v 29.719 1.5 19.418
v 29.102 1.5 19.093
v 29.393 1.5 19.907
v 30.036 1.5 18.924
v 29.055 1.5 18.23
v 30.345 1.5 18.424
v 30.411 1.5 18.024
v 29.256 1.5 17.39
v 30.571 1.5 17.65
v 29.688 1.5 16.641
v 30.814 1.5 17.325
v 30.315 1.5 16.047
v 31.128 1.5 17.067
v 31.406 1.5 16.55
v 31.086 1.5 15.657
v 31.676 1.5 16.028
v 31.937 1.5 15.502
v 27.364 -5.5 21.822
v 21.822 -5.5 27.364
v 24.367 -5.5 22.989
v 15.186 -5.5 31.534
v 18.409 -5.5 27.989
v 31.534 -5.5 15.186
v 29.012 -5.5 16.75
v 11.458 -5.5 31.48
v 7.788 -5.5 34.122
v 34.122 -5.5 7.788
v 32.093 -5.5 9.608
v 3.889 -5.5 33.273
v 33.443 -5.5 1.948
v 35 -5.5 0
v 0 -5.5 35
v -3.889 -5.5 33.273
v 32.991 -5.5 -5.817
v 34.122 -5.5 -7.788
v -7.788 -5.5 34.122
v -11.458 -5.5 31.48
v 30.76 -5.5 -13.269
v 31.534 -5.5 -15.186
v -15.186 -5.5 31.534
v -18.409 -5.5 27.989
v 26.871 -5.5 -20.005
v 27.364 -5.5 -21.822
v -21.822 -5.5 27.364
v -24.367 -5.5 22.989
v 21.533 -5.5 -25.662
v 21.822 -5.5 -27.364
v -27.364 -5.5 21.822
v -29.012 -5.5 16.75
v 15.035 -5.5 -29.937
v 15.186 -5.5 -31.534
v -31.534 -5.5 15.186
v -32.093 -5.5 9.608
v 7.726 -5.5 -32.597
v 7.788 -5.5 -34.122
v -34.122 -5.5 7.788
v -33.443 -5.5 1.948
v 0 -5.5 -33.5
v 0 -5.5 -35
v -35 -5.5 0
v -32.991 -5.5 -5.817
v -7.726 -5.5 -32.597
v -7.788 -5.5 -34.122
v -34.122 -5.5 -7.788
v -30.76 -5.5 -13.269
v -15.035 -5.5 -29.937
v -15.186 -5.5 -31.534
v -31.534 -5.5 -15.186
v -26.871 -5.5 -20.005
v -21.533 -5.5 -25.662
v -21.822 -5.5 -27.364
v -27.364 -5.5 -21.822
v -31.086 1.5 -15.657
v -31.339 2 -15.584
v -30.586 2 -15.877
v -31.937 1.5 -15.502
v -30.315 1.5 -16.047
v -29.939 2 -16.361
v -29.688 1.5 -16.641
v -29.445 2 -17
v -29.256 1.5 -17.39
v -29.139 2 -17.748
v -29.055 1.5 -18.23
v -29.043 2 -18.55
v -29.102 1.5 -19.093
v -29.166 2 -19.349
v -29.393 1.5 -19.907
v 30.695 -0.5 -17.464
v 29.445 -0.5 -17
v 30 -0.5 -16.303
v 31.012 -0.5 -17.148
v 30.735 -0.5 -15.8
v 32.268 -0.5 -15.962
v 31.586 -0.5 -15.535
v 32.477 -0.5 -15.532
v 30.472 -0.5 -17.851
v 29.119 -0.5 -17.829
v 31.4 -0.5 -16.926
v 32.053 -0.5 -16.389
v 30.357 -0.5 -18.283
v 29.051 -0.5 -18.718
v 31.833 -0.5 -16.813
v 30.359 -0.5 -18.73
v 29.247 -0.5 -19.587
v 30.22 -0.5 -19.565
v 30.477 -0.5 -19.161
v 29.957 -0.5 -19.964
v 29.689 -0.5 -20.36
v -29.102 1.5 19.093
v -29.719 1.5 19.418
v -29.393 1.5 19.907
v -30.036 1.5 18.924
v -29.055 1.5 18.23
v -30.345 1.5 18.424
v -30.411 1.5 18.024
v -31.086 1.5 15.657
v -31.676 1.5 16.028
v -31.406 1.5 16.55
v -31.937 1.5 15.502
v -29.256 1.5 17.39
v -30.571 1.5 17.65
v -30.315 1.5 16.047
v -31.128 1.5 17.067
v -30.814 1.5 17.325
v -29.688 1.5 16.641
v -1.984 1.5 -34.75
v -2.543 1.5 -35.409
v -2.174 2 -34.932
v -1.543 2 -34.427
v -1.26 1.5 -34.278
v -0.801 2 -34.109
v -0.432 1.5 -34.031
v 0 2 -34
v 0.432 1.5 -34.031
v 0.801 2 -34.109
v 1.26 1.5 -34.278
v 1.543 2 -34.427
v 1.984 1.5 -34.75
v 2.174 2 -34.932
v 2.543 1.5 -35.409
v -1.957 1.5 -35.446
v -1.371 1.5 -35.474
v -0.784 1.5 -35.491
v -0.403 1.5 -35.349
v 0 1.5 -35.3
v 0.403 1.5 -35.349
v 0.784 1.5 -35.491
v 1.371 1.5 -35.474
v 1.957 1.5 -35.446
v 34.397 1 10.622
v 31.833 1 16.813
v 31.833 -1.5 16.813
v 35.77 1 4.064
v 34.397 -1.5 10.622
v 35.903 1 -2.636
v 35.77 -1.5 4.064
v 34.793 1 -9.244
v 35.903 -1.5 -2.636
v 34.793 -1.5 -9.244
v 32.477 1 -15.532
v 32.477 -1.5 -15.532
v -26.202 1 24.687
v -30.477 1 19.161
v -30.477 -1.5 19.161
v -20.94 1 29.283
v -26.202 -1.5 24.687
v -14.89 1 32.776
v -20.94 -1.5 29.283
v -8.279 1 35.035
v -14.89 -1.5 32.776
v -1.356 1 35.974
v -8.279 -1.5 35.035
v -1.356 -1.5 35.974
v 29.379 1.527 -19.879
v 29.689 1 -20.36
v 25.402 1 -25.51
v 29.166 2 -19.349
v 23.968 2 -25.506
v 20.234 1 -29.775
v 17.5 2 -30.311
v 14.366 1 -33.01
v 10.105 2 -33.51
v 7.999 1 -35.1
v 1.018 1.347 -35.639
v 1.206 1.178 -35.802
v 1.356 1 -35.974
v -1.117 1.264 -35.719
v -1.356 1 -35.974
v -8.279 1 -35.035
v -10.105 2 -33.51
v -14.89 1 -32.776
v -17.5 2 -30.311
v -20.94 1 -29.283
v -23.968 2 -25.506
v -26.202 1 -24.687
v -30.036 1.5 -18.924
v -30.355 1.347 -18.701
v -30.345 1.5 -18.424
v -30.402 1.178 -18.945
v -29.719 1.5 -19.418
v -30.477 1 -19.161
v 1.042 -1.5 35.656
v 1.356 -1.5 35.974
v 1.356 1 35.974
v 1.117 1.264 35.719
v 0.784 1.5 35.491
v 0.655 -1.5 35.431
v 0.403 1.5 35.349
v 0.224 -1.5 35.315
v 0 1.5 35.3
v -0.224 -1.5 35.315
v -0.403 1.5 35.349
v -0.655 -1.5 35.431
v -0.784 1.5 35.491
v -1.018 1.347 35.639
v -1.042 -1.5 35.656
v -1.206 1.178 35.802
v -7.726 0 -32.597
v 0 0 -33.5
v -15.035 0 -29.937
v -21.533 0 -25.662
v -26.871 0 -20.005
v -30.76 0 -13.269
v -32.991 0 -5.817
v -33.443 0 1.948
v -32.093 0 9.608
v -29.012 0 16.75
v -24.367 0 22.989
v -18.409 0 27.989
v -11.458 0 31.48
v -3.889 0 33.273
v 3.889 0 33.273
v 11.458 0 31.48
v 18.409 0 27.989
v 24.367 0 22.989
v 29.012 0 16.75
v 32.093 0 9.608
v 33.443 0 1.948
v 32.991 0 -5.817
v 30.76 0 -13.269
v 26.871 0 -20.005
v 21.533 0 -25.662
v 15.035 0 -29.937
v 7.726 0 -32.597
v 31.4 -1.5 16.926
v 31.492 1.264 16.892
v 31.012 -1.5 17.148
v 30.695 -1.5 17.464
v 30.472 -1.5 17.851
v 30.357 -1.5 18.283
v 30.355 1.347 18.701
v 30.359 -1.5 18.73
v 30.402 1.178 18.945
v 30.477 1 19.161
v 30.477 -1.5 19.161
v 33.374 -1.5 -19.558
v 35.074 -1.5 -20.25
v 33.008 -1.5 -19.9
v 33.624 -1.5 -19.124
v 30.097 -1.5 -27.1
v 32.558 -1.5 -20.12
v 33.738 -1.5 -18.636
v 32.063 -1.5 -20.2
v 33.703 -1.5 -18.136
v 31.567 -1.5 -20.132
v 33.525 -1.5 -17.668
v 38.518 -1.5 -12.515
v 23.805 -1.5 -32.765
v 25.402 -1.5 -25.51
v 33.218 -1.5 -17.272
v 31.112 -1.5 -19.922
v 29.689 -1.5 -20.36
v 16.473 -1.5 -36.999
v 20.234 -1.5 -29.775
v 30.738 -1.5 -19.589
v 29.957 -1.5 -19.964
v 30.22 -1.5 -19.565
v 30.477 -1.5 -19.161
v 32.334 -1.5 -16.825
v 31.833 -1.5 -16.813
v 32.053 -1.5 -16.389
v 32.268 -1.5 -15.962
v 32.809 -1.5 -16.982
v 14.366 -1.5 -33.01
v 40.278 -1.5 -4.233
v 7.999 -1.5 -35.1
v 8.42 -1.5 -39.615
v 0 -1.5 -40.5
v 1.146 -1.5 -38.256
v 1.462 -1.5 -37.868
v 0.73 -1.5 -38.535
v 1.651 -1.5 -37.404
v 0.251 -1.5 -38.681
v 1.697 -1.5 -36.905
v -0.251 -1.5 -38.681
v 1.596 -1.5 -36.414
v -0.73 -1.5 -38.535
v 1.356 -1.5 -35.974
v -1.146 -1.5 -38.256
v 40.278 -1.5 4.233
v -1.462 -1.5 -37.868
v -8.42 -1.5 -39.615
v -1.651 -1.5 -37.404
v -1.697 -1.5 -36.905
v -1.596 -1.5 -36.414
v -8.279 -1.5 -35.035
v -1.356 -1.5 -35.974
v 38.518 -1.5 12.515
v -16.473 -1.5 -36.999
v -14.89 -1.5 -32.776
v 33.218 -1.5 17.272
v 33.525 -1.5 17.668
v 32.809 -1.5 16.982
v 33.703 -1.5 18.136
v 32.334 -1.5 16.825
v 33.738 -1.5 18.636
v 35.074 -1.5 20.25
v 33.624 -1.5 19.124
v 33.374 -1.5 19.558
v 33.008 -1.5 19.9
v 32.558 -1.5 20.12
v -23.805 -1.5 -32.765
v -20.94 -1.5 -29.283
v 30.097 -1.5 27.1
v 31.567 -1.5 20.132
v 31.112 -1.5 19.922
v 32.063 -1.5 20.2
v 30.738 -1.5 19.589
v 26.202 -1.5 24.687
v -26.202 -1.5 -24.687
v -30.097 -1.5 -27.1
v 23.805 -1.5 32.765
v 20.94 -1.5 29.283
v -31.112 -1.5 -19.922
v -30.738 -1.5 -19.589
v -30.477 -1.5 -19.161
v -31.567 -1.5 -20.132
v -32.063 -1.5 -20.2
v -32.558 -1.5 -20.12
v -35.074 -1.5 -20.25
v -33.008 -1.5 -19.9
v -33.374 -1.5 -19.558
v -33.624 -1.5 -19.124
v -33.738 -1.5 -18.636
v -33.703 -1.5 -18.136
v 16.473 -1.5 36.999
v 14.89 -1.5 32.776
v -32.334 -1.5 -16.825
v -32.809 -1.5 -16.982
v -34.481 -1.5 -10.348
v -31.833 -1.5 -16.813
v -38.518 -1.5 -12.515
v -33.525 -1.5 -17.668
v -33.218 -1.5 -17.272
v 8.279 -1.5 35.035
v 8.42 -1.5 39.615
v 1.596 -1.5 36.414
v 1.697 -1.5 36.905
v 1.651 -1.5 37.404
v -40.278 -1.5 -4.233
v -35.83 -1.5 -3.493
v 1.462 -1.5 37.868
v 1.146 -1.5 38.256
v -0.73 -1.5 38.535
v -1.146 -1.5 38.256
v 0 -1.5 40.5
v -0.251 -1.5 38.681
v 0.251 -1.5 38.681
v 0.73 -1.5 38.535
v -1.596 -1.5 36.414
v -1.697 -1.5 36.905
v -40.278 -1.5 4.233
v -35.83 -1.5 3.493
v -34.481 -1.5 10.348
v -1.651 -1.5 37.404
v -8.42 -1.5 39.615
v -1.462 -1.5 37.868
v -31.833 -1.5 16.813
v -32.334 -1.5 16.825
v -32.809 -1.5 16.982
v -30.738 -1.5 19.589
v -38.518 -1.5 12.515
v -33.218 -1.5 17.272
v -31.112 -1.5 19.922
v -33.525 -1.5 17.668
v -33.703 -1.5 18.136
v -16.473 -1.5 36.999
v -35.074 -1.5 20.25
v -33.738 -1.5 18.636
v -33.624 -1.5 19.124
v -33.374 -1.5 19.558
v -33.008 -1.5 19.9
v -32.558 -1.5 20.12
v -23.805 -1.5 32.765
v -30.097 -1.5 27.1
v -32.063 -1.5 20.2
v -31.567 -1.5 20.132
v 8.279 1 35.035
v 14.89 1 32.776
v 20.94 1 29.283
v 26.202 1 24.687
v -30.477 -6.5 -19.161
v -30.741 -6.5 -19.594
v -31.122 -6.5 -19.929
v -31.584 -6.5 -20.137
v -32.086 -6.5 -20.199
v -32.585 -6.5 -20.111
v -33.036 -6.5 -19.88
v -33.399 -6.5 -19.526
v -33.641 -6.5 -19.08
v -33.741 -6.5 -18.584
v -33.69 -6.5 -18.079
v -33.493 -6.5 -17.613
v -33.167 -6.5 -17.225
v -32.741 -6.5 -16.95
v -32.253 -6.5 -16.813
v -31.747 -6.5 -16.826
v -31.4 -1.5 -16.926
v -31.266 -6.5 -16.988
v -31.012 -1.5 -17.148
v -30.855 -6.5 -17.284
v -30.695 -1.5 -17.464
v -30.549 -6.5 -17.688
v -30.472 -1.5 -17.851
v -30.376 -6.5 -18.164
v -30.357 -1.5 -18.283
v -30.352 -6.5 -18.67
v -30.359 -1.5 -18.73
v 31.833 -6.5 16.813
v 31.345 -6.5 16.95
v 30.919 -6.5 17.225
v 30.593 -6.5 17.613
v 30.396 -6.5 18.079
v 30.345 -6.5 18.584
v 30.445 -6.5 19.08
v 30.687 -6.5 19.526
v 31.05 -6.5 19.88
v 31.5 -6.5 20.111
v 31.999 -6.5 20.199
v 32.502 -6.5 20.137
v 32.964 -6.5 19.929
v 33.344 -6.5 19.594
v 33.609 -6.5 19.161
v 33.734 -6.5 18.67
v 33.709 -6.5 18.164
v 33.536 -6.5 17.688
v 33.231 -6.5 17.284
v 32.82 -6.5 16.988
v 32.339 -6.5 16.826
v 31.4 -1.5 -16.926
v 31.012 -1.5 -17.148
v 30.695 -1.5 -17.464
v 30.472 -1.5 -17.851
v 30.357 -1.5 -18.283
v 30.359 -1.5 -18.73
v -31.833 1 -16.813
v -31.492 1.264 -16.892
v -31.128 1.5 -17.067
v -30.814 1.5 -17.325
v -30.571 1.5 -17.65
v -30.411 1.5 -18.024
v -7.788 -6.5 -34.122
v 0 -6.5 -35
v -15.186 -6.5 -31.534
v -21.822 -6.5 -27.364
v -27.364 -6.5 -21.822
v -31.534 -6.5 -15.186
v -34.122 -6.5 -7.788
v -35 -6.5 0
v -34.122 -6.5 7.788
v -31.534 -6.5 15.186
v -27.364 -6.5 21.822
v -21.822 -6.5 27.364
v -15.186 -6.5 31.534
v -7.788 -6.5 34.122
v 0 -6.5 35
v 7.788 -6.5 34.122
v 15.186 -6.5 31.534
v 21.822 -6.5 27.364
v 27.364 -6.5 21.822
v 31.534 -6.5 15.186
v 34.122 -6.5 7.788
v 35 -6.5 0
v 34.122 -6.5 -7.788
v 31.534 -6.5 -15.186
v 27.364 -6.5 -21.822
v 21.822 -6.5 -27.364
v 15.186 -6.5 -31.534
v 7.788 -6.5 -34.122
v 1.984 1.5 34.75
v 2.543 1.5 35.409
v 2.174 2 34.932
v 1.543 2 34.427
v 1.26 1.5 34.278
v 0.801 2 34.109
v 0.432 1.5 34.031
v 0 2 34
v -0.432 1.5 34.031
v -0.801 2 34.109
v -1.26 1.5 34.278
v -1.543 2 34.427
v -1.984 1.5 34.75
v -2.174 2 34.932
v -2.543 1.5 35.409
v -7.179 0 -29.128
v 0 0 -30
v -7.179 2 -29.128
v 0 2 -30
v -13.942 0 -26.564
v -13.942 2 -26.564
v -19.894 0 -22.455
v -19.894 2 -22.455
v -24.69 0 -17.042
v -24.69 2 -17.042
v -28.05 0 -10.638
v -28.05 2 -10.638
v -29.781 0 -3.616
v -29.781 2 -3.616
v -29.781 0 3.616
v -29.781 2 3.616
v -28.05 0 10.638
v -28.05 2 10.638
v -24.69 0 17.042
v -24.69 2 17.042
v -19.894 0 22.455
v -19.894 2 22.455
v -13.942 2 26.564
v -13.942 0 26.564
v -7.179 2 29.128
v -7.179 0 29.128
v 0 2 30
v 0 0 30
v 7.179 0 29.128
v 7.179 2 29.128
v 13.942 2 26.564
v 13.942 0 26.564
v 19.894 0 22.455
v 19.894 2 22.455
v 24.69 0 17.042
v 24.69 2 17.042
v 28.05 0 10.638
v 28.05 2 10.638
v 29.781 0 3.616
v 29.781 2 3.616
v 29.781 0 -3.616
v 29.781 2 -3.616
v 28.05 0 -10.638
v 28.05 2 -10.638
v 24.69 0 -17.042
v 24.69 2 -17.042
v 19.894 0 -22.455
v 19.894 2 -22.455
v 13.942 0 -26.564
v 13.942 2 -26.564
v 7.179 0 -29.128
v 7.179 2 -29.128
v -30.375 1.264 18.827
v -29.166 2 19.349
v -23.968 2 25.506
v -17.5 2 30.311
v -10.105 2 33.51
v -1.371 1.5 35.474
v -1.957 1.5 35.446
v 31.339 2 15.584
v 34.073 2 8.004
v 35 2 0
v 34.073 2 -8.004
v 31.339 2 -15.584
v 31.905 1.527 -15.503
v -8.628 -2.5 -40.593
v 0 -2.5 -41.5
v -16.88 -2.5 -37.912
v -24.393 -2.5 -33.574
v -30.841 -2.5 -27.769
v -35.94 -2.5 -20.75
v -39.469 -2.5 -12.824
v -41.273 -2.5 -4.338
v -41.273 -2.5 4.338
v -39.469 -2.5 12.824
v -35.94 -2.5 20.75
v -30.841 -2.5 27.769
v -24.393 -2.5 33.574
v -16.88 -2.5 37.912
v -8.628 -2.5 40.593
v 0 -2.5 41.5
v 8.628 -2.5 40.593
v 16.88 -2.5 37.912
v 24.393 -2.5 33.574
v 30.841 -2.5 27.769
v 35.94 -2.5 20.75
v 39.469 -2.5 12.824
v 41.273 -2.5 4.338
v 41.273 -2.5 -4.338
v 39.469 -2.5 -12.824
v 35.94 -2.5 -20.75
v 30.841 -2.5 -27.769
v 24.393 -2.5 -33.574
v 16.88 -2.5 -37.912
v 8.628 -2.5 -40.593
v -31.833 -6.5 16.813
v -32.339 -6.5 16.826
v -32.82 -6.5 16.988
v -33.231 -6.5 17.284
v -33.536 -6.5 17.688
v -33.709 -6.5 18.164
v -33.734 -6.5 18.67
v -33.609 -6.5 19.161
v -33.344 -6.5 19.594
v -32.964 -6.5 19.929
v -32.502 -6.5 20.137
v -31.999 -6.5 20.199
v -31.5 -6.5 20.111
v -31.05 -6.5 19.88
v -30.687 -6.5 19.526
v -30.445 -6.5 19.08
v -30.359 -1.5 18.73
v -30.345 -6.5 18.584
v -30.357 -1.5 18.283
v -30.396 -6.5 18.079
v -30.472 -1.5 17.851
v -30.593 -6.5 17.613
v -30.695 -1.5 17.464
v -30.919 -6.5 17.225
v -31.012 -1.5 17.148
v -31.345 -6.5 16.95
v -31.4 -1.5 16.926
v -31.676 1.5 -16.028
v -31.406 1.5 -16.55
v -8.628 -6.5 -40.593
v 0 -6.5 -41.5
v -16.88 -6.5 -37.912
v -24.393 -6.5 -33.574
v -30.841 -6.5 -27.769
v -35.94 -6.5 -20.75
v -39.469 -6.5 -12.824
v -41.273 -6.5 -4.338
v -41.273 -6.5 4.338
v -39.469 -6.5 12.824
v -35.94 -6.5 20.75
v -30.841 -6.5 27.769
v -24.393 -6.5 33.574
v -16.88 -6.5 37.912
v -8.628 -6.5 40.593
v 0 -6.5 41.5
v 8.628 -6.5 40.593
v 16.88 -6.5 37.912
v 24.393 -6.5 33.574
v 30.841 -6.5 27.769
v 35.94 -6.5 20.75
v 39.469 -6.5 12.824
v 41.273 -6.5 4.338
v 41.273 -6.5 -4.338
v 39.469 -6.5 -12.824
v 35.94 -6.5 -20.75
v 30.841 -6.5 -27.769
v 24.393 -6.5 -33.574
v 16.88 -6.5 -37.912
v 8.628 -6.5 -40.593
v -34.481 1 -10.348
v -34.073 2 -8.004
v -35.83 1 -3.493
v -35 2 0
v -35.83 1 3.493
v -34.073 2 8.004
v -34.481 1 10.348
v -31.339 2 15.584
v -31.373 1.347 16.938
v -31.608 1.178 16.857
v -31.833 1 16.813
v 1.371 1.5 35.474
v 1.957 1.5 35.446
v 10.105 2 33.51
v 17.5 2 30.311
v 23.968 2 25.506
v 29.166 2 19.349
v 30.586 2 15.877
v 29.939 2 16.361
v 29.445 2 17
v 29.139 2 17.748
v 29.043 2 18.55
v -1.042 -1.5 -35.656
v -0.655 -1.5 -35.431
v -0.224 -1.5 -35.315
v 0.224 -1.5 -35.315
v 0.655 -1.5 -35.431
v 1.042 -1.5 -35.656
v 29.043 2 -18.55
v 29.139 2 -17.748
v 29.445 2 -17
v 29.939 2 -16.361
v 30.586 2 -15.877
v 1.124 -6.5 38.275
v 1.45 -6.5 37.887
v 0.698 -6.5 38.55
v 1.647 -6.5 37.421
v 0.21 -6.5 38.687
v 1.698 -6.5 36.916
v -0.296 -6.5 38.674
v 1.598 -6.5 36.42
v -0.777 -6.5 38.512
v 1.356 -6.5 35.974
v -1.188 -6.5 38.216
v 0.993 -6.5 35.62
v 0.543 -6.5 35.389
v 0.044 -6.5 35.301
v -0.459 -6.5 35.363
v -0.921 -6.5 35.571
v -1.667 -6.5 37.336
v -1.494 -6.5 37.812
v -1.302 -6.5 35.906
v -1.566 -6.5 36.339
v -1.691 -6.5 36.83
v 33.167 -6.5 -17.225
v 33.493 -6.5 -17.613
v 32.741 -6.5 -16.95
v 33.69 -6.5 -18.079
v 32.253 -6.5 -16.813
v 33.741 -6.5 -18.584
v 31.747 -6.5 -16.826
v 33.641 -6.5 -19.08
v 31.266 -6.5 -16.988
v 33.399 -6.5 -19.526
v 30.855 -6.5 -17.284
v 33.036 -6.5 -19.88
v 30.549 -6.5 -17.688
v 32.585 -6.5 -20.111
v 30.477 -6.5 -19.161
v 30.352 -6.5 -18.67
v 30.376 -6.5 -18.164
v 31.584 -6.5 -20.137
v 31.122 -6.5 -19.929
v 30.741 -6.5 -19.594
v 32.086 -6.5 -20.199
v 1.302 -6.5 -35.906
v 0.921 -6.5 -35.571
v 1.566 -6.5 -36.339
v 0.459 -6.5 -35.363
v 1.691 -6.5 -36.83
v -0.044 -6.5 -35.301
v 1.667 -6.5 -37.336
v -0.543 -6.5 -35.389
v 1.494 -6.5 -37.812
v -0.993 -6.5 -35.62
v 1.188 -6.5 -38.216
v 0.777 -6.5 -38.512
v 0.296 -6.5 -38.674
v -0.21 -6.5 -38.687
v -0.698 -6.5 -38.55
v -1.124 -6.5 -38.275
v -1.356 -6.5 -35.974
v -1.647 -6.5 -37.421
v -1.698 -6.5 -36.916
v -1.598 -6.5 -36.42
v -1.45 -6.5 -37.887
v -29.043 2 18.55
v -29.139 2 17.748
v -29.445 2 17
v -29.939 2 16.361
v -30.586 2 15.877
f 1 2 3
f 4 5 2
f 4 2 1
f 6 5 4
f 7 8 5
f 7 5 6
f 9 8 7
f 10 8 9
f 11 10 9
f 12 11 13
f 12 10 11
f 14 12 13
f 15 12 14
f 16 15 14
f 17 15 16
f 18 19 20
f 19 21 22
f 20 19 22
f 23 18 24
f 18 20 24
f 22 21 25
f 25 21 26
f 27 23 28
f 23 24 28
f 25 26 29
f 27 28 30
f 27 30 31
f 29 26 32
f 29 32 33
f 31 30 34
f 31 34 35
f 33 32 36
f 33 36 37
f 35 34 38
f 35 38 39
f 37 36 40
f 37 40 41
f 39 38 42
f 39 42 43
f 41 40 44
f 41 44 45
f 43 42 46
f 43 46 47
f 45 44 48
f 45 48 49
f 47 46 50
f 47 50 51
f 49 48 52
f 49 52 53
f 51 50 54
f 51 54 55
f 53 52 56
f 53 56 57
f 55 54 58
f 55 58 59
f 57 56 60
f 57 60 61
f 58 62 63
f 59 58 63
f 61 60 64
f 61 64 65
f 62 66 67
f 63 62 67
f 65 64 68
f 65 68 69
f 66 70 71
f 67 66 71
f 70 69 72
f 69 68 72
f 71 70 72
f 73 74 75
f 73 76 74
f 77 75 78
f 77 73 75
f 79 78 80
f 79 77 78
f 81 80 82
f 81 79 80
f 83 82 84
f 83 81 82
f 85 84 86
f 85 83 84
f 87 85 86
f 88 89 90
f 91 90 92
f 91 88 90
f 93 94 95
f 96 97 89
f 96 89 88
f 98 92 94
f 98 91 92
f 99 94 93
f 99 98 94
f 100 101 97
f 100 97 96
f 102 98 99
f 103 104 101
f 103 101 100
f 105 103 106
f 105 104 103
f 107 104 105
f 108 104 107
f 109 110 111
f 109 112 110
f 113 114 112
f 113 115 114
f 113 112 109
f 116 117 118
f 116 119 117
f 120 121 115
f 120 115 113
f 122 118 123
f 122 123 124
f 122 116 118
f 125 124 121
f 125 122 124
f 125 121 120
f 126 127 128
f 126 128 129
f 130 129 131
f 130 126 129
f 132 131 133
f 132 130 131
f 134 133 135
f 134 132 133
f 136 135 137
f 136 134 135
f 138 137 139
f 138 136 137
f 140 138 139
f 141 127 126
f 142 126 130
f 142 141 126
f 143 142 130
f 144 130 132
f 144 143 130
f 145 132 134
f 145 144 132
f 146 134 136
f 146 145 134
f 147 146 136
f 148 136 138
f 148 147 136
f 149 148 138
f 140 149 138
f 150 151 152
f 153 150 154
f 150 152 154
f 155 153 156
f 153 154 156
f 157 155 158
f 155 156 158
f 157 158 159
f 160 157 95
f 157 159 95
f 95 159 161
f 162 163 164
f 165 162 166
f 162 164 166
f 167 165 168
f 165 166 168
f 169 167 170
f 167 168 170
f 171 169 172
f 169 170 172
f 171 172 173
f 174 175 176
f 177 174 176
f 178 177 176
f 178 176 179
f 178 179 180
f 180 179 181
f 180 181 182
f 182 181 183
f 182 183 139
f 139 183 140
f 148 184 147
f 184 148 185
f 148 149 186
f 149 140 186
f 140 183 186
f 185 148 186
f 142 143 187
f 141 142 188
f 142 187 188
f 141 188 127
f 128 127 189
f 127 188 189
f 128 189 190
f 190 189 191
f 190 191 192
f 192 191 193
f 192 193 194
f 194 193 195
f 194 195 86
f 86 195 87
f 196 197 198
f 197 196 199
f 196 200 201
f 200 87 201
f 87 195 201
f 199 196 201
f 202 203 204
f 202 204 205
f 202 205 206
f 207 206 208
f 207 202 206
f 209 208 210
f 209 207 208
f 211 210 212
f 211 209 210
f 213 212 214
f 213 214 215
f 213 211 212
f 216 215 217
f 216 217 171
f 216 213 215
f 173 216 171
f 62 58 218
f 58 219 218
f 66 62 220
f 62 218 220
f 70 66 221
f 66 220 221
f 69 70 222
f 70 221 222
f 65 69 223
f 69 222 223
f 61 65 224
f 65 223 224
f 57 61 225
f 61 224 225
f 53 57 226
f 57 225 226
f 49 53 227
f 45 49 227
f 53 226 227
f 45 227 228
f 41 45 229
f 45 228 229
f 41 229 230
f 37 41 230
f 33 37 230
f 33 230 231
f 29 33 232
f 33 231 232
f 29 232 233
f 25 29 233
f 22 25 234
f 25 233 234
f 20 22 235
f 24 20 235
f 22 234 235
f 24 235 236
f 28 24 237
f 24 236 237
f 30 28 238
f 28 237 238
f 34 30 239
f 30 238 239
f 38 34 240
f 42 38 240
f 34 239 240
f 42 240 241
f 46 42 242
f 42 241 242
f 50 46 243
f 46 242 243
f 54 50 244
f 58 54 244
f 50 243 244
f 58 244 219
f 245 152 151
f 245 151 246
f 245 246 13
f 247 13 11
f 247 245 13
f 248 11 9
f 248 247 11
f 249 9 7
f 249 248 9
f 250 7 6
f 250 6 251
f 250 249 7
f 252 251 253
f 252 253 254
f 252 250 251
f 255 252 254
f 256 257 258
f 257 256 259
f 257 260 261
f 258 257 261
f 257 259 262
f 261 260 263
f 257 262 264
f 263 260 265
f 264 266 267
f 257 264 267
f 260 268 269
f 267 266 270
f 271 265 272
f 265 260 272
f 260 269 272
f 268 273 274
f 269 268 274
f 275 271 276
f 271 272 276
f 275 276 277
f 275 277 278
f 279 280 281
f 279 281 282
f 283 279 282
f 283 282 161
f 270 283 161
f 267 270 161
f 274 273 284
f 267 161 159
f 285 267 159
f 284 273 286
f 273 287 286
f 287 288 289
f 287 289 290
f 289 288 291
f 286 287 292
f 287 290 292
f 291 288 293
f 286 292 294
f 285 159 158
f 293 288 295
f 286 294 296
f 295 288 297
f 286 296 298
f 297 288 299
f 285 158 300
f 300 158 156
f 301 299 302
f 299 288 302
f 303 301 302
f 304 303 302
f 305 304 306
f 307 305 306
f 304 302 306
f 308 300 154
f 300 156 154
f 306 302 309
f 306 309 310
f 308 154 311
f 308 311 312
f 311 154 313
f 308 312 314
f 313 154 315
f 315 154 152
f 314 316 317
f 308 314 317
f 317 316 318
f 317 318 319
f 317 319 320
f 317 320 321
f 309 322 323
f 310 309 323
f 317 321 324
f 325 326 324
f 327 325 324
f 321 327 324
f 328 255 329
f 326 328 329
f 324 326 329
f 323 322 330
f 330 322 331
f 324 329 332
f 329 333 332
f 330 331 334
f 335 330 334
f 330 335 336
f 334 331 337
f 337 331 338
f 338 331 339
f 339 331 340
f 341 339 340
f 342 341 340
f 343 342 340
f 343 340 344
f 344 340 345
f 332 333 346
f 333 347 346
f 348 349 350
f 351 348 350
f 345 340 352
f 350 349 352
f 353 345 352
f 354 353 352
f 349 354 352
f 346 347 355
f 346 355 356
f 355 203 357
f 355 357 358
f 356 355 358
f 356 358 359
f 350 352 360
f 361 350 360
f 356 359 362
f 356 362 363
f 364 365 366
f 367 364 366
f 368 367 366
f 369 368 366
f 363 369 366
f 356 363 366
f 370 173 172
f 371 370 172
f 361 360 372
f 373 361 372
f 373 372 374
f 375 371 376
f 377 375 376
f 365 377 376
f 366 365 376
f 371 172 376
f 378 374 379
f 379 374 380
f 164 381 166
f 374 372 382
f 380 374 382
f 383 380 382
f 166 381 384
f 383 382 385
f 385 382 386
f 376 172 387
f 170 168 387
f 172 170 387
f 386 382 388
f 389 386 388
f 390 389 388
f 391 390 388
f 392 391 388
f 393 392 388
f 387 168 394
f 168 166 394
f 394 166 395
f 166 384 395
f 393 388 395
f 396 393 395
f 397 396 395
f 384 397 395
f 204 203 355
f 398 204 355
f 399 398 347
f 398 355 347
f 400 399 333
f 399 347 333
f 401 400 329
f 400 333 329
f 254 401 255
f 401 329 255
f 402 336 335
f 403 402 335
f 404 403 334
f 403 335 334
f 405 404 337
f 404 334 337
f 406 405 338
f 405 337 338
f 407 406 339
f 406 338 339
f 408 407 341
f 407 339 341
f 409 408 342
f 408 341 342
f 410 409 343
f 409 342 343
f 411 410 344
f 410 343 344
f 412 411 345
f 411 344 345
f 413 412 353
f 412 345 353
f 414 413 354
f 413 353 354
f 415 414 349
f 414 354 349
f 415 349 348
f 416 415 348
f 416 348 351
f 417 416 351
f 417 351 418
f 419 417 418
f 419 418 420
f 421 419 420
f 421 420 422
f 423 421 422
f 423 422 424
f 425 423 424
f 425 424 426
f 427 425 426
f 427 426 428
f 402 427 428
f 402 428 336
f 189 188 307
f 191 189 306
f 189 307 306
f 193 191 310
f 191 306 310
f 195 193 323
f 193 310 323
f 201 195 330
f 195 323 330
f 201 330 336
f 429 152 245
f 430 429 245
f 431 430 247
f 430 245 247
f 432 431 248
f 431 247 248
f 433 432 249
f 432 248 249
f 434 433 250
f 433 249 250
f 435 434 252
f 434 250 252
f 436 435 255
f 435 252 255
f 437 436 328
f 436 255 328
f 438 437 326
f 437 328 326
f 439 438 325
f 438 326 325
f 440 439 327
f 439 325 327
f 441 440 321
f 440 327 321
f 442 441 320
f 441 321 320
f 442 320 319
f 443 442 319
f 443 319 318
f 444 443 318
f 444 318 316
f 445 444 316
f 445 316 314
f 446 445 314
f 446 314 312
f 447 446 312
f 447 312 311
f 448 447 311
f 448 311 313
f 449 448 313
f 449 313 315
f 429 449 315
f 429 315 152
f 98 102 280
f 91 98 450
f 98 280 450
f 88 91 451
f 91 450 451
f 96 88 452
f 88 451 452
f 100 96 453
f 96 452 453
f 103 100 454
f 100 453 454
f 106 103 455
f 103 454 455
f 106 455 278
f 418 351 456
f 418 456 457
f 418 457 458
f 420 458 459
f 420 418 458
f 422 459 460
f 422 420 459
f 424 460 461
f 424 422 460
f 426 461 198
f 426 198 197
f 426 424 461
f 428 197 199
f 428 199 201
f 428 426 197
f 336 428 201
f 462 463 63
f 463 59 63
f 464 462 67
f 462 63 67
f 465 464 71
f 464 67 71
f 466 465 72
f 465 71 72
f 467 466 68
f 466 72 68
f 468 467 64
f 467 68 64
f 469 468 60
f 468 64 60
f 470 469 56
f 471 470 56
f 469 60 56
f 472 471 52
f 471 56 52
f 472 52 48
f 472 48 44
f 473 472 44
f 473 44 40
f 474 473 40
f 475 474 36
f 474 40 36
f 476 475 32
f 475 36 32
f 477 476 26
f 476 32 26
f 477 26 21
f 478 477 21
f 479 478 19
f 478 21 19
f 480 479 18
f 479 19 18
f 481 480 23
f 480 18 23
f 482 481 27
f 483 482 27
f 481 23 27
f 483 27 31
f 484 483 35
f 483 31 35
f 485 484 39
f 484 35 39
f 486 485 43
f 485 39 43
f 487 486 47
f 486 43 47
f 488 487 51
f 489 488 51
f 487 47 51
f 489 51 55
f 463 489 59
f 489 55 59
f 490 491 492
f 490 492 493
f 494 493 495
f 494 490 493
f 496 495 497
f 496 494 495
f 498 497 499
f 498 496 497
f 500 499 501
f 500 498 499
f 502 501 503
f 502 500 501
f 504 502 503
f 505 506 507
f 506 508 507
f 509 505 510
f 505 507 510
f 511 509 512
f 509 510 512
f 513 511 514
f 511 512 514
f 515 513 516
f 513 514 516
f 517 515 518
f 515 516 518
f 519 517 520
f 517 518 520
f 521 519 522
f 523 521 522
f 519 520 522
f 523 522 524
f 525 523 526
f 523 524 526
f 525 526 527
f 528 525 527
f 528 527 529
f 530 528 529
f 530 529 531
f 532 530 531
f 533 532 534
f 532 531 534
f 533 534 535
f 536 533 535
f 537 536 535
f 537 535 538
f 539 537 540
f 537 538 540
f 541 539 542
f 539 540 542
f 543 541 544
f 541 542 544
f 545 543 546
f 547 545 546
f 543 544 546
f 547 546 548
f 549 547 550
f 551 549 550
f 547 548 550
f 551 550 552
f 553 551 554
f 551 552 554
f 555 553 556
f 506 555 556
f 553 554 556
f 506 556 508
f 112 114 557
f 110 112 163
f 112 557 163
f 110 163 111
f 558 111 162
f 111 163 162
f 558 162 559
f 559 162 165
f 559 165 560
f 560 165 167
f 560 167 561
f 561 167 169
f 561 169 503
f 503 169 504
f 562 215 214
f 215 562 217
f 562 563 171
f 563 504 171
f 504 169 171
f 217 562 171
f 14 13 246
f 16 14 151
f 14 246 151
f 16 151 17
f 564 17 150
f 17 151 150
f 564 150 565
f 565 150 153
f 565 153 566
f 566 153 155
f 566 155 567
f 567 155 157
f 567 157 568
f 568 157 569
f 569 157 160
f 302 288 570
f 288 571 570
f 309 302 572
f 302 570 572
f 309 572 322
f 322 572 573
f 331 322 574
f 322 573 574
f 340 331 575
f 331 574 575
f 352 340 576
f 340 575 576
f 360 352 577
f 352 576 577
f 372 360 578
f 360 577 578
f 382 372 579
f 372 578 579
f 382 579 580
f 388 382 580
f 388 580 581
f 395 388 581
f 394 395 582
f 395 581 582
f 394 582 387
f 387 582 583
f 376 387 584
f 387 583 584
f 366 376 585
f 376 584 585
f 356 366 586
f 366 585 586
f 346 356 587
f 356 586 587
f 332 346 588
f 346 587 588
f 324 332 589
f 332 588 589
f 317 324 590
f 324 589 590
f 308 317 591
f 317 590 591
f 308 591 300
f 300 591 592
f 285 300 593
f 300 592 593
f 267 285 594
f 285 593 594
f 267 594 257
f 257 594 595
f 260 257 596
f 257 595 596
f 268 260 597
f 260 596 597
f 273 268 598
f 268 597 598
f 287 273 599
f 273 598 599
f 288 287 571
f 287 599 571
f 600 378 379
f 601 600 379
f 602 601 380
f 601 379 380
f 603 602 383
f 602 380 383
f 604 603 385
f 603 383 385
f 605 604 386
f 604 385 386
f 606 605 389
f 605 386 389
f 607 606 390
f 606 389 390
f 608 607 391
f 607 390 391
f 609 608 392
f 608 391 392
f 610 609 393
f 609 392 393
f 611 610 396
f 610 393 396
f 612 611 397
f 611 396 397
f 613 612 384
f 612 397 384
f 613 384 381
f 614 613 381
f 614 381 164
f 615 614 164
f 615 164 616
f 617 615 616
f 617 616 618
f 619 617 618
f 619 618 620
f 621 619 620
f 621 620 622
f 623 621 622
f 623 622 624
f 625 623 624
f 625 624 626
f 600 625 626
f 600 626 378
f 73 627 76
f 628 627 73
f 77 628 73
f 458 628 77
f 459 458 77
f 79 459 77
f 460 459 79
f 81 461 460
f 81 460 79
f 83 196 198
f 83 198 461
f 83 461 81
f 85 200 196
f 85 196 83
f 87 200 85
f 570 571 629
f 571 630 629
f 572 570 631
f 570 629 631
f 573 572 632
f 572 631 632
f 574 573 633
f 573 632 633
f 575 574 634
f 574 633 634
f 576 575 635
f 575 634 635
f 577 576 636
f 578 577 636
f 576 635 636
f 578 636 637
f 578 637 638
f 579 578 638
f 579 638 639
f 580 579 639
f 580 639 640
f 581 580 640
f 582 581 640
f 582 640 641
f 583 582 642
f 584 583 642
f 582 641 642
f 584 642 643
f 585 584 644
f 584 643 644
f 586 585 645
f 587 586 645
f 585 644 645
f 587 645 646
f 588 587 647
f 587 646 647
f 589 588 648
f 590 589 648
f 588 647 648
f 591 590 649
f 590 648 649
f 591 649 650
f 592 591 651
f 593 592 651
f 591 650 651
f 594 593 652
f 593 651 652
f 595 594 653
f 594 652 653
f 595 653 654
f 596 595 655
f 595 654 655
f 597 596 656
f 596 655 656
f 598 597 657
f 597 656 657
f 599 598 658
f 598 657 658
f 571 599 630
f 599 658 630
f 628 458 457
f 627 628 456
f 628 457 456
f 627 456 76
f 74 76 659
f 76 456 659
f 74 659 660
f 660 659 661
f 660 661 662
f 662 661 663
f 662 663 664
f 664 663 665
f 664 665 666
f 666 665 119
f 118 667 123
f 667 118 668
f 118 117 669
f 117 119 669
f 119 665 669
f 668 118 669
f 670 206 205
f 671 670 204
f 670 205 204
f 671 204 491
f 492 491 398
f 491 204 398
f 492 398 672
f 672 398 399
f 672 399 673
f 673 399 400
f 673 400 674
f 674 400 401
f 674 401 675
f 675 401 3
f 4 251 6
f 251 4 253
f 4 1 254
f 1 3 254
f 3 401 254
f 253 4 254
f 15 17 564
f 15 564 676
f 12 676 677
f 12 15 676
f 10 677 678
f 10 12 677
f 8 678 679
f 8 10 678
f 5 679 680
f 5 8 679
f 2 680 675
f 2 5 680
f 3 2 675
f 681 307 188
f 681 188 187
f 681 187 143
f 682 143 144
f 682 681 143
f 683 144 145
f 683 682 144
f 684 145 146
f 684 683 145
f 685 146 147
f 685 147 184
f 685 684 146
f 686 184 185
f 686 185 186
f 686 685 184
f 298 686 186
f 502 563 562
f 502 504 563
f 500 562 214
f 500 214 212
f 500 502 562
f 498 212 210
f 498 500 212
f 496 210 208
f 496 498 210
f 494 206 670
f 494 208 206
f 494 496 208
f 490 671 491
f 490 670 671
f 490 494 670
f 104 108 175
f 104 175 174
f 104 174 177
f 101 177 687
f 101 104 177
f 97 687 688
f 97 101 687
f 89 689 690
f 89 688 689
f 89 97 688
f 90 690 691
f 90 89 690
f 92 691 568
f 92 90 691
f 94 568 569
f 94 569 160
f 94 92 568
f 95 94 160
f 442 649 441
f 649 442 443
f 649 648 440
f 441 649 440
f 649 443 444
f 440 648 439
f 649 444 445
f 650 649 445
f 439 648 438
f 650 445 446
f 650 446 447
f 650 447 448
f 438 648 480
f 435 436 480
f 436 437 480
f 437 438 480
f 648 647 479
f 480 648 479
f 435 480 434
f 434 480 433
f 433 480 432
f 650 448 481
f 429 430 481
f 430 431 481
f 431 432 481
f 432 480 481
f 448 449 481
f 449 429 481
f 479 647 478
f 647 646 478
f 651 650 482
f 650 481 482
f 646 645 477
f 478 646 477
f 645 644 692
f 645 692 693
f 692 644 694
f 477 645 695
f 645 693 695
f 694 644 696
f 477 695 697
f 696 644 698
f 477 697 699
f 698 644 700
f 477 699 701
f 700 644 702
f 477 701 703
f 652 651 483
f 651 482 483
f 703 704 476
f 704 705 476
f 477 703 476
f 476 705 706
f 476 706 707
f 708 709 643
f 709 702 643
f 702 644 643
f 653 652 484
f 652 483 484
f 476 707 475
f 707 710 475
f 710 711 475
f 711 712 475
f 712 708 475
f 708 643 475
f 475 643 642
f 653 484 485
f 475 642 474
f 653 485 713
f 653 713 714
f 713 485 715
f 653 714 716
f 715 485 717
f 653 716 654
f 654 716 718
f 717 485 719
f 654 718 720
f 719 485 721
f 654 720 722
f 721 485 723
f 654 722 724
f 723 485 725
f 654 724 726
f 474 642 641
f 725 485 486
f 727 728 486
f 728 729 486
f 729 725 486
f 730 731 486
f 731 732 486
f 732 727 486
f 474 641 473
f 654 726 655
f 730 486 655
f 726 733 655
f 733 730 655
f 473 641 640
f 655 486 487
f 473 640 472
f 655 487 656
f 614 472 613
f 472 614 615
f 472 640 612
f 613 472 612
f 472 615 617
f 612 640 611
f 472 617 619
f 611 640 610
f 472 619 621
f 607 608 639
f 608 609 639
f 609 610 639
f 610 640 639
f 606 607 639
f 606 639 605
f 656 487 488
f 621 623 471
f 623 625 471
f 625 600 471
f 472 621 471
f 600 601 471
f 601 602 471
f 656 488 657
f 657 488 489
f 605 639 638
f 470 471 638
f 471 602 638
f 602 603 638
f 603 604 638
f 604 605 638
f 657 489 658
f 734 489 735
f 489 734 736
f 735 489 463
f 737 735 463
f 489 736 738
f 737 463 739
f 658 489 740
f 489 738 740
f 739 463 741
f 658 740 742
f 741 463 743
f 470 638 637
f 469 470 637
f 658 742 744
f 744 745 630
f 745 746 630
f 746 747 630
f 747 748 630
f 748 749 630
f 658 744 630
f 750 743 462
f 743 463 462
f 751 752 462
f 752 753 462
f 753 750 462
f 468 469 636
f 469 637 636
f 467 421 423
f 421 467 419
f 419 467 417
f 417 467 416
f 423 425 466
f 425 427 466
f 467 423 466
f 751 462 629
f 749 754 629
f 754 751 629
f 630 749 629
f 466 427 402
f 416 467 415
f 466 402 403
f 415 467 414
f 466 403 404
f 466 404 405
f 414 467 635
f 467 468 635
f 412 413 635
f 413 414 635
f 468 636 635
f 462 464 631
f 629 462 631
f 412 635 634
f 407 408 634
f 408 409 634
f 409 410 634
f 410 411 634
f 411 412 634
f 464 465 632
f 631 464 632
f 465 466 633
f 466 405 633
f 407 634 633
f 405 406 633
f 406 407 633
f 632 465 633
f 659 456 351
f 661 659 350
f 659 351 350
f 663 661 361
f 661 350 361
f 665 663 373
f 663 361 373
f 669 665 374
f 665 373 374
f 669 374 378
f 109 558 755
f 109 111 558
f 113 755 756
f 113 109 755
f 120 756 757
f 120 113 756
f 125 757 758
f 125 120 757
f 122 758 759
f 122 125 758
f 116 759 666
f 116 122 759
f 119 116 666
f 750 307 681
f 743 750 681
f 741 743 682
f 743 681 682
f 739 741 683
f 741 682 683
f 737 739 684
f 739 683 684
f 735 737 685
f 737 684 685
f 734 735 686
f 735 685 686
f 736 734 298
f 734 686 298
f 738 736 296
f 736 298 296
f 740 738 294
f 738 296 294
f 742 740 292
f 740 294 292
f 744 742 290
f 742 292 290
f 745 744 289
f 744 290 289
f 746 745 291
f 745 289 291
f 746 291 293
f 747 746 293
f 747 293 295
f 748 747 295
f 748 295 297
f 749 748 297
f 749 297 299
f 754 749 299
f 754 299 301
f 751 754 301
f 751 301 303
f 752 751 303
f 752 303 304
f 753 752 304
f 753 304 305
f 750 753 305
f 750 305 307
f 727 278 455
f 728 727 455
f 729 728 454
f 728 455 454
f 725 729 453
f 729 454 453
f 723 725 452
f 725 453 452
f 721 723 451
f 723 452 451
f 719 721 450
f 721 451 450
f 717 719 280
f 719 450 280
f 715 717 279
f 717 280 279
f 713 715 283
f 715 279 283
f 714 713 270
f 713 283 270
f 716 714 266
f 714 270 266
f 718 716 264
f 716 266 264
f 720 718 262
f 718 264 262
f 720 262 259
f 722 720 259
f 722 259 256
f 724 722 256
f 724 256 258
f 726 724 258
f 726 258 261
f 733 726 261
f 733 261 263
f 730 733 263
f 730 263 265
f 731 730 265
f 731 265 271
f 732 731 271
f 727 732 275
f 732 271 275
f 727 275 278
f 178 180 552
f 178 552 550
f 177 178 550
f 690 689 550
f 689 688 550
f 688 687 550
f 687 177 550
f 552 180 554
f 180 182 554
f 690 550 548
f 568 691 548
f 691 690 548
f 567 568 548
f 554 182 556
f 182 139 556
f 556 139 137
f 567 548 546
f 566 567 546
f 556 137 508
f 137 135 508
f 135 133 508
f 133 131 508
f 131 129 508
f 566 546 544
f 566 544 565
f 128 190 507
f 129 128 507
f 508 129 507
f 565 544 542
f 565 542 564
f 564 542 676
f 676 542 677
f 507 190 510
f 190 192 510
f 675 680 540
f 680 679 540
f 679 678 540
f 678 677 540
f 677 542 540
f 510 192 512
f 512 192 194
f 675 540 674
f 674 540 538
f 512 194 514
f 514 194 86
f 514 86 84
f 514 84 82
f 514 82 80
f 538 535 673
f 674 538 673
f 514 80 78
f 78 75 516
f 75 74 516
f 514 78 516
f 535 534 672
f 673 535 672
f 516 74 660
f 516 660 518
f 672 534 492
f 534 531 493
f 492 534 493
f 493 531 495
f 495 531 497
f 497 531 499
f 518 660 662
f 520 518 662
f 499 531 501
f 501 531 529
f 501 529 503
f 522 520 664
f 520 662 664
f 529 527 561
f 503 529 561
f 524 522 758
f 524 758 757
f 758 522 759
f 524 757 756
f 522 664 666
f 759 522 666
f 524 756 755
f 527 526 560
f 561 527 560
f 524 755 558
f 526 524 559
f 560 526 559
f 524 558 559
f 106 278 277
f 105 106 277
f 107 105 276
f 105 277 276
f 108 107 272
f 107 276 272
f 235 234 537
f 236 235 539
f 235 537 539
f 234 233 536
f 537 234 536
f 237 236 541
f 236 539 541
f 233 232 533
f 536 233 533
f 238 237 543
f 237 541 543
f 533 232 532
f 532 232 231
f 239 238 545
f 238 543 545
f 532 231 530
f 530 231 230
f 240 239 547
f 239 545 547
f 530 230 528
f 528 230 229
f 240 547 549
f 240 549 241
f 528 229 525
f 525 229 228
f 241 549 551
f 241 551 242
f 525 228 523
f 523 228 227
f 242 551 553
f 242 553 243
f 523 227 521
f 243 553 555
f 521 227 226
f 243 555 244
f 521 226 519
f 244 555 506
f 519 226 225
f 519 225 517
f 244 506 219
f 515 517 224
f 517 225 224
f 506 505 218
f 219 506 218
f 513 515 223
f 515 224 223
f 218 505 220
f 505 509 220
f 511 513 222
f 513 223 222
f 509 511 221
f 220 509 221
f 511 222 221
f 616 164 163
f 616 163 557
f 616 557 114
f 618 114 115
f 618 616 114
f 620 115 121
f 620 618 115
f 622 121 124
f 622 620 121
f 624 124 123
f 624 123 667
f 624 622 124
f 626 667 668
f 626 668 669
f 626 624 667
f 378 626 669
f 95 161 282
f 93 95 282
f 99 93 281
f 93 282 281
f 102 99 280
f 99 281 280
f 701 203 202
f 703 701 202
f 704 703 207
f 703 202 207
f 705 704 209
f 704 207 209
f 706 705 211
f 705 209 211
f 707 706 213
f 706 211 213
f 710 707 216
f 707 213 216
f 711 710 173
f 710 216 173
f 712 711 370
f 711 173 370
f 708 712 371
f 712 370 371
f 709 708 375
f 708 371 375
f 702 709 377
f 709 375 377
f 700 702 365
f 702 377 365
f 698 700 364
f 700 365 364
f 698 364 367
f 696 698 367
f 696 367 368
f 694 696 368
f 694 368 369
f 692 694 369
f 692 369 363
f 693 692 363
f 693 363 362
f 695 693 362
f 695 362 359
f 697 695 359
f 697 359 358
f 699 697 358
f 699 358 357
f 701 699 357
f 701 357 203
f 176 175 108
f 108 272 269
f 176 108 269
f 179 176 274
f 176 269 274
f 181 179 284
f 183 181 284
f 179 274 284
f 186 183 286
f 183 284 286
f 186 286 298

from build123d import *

# Parameters (mm, degrees)
SKETCH_3_R                      = 1.7
CUT_EXTRUDE_1_DEPTH             = 10
CUT_EXTRUDE_1_DIRECTION_2_REACH = 60.902
CUT_EXTRUDE_START               = 3
SKETCH_4_R                      = 3
CUT_EXTRUDE_2_DEPTH             = 3
SKETCH_7_R                      = 3
CUT_EXTRUDE_3_DEPTH             = 10
EXTRUDE_1_DEPTH                 = 1
CHAMFER_1_SIZE                  = 1


with BuildPart() as part:
    # 草图2 → 旋转1 (revolve)
    with BuildSketch(Plane(origin=(0, 0, 0), x_dir=(0, 0, -1), z_dir=(1, 0, 0)), mode=Mode.PRIVATE) as revolve_1_sk:
        Polygon((-30, 0), (-30, 2), (-36, 2), (-36, -1.5), (-41.5, -1.5), (-41.5, -6.5), (-35, -6.5), (-35, -5.5), (-33.5, -5.5), (-33.5, 0), align=None)
    revolve(revolve_1_sk.sketch.rotate(Axis((0, 0, 0), (0, 1, 0)), 180), axis=Axis((0, 0, 0), (0, 1, 0)))

    # 草图3 → 切除-拉伸1 (cut)
    with BuildSketch(Plane(origin=(0, -1.5, 0), x_dir=(1, 0, 0), z_dir=(0, 1, 0))):
        with Locations(Location((0, 37, 0), (0, 0, 217.103674805))):
            Circle(SKETCH_3_R)
        with Locations(Location((32.04293994, 18.5, 0), (0, 0, 157.103674805))):
            Circle(SKETCH_3_R)
        with Locations(Location((32.04293994, -18.5, 0), (0, 0, 97.103674805))):
            Circle(SKETCH_3_R)
        with Locations(Location((0, -37, 0), (0, 0, 37.103674804))):
            Circle(SKETCH_3_R)
        with Locations(Location((-32.04293994, -18.5, 0), (0, 0, 82.896325196))):
            Circle(SKETCH_3_R)
        with Locations(Location((-32.04293994, 18.5, 0), (0, 0, 22.896325196))):
            Circle(SKETCH_3_R)
    extrude(amount=-CUT_EXTRUDE_1_DEPTH, mode=Mode.SUBTRACT)

    # 草图3 → 切除-拉伸1 direction 2 (cut, up to next)
    with BuildSketch(Plane(origin=(0, -1.5, 0), x_dir=(1, 0, 0), z_dir=(0, 1, 0)), mode=Mode.PRIVATE) as cut_extrude_1_direction_2_sk1:
        with Locations(Location((0, 37, 0), (0, 0, 217.103674805))):
            Circle(SKETCH_3_R)
    cut_extrude_1_direction_2_tool1 = extrude(cut_extrude_1_direction_2_sk1.sketch, amount=CUT_EXTRUDE_1_DIRECTION_2_REACH, mode=Mode.PRIVATE) & part.part
    # 草图3 → 切除-拉伸1 direction 2 (cut, up to next)
    with BuildSketch(Plane(origin=(0, -1.5, 0), x_dir=(1, 0, 0), z_dir=(0, 1, 0)), mode=Mode.PRIVATE) as cut_extrude_1_direction_2_sk2:
        with Locations(Location((32.04293994, 18.5, 0), (0, 0, 157.103674805))):
            Circle(SKETCH_3_R)
    cut_extrude_1_direction_2_tool2 = extrude(cut_extrude_1_direction_2_sk2.sketch, amount=CUT_EXTRUDE_1_DIRECTION_2_REACH, mode=Mode.PRIVATE) & part.part
    # 草图3 → 切除-拉伸1 direction 2 (cut, up to next)
    with BuildSketch(Plane(origin=(0, -1.5, 0), x_dir=(1, 0, 0), z_dir=(0, 1, 0)), mode=Mode.PRIVATE) as cut_extrude_1_direction_2_sk3:
        with Locations(Location((32.04293994, -18.5, 0), (0, 0, 97.103674805))):
            Circle(SKETCH_3_R)
    cut_extrude_1_direction_2_tool3 = extrude(cut_extrude_1_direction_2_sk3.sketch, amount=CUT_EXTRUDE_1_DIRECTION_2_REACH, mode=Mode.PRIVATE) & part.part
    # 草图3 → 切除-拉伸1 direction 2 (cut, up to next)
    with BuildSketch(Plane(origin=(0, -1.5, 0), x_dir=(1, 0, 0), z_dir=(0, 1, 0)), mode=Mode.PRIVATE) as cut_extrude_1_direction_2_sk4:
        with Locations(Location((0, -37, 0), (0, 0, 37.103674804))):
            Circle(SKETCH_3_R)
    cut_extrude_1_direction_2_tool4 = extrude(cut_extrude_1_direction_2_sk4.sketch, amount=CUT_EXTRUDE_1_DIRECTION_2_REACH, mode=Mode.PRIVATE) & part.part
    # 草图3 → 切除-拉伸1 direction 2 (cut, up to next)
    with BuildSketch(Plane(origin=(0, -1.5, 0), x_dir=(1, 0, 0), z_dir=(0, 1, 0)), mode=Mode.PRIVATE) as cut_extrude_1_direction_2_sk5:
        with Locations(Location((-32.04293994, -18.5, 0), (0, 0, 82.896325196))):
            Circle(SKETCH_3_R)
    cut_extrude_1_direction_2_tool5 = extrude(cut_extrude_1_direction_2_sk5.sketch, amount=CUT_EXTRUDE_1_DIRECTION_2_REACH, mode=Mode.PRIVATE) & part.part
    # 草图3 → 切除-拉伸1 direction 2 (cut, up to next)
    with BuildSketch(Plane(origin=(0, -1.5, 0), x_dir=(1, 0, 0), z_dir=(0, 1, 0)), mode=Mode.PRIVATE) as cut_extrude_1_direction_2_sk6:
        with Locations(Location((-32.04293994, 18.5, 0), (0, 0, 22.896325196))):
            Circle(SKETCH_3_R)
    cut_extrude_1_direction_2_tool6 = extrude(cut_extrude_1_direction_2_sk6.sketch, amount=CUT_EXTRUDE_1_DIRECTION_2_REACH, mode=Mode.PRIVATE) & part.part
    add(cut_extrude_1_direction_2_tool1.solids().sort_by_distance((0, -1.5, -37))[0], mode=Mode.SUBTRACT)
    add(cut_extrude_1_direction_2_tool2.solids().sort_by_distance((32.04294, -1.5, -18.5))[0], mode=Mode.SUBTRACT)
    add(cut_extrude_1_direction_2_tool3.solids().sort_by_distance((32.04294, -1.5, 18.5))[0], mode=Mode.SUBTRACT)
    add(cut_extrude_1_direction_2_tool4.solids().sort_by_distance((0, -1.5, 37))[0], mode=Mode.SUBTRACT)
    add(cut_extrude_1_direction_2_tool5.solids().sort_by_distance((-32.04294, -1.5, 18.5))[0], mode=Mode.SUBTRACT)
    add(cut_extrude_1_direction_2_tool6.solids().sort_by_distance((-32.04294, -1.5, -18.5))[0], mode=Mode.SUBTRACT)

    # 草图4 → 切除-拉伸2 (cut)
    with BuildSketch(Plane(origin=(0, -1.5, 0), x_dir=(1, 0, 0), z_dir=(0, 1, 0)).offset(CUT_EXTRUDE_START)):
        with Locations((0, 37)):
            Circle(SKETCH_4_R)
        with Locations((32.04293994, 18.5)):
            Circle(SKETCH_4_R)
        with Locations((32.04293994, -18.5)):
            Circle(SKETCH_4_R)
        with Locations((0, -37)):
            Circle(SKETCH_4_R)
        with Locations((-32.04293994, -18.5)):
            Circle(SKETCH_4_R)
        with Locations((-32.04293994, 18.5)):
            Circle(SKETCH_4_R)
    extrude(amount=CUT_EXTRUDE_2_DEPTH, mode=Mode.SUBTRACT)

    # 草图7 → 切除-拉伸3 (cut)
    with BuildSketch(Plane(origin=(0, -1.5, 0), x_dir=(1, 0, 0), z_dir=(0, 1, 0))):
        with Locations((32.04293994, 18.5)):
            Circle(SKETCH_7_R)
    extrude(amount=CUT_EXTRUDE_3_DEPTH, mode=Mode.SUBTRACT)

    # 草图8 → 凸台-拉伸1 (add)
    with BuildSketch(Plane(origin=(0, -1.5, 0), x_dir=(1, 0, 0), z_dir=(0, 1, 0))):
        with BuildLine():
            ThreePointArc((30.476882326, 19.161410274), (30.089095942, 19.764774357), (29.689366173, 20.360293128))
            ThreePointArc((29.689366173, 20.360293128), (29.444863729, 17), (32.477214164, 15.531598764))
            ThreePointArc((32.477214164, 15.531598764), (32.161344664, 16.175534285), (31.832709232, 16.813049186))
            ThreePointArc((31.832709232, 16.813049186), (30.570696754, 17.65), (30.476882326, 19.161410274))
        make_face()
    extrude(amount=EXTRUDE_1_DEPTH)

    # 倒角1
    # the kernel refuses this chamfer: 1 mm, written as the material it takes off along each edge
    with BuildSketch(Plane(origin=(0, 2, 0), x_dir=(0.00607290176343859, 0, 0.9999815597620647), z_dir=(-0.9999815597620647, 0, 0.00607290176343859))) as chamfer_1_piece_1:
        Polygon((36 - CHAMFER_1_SIZE, 0), (36, -CHAMFER_1_SIZE), (36, 0), align=None)
    revolve(axis=Axis((0, 2, 0), (0, 1, 0)), revolution_arc=59.304092442, mode=Mode.SUBTRACT)
    with BuildSketch(Plane(origin=(0, 2, 0), x_dir=(-0.8629729831882226, 0, 0.5052500670828455), z_dir=(-0.5052500670828455, 0, -0.8629729831882226))) as chamfer_1_piece_2:
        Polygon((36 - CHAMFER_1_SIZE, 0), (36, -CHAMFER_1_SIZE), (36, 0), align=None)
    revolve(axis=Axis((0, 2, 0), (0, 1, 0)), revolution_arc=59.304092442, mode=Mode.SUBTRACT)
    with BuildSketch(Plane(origin=(0, 2, 0), x_dir=(-0.8690458849516061, 0, -0.49473149267929145), z_dir=(0.49473149267929145, 0, -0.8690458849516061))) as chamfer_1_piece_3:
        Polygon((36 - CHAMFER_1_SIZE, 0), (36, -CHAMFER_1_SIZE), (36, 0), align=None)
    revolve(axis=Axis((0, 2, 0), (0, 1, 0)), revolution_arc=59.304092442, mode=Mode.SUBTRACT)
    with BuildSketch(Plane(origin=(0, 2, 0), x_dir=(-0.00607290176325947, 0, -0.9999815597620656), z_dir=(0.9999815597620656, 0, -0.00607290176325947))) as chamfer_1_piece_4:
        Polygon((36 - CHAMFER_1_SIZE, 0), (36, -CHAMFER_1_SIZE), (36, 0), align=None)
    revolve(axis=Axis((0, 2, 0), (0, 1, 0)), revolution_arc=59.304092442, mode=Mode.SUBTRACT)
    with BuildSketch(Plane(origin=(0, 2, 0), x_dir=(0.8629729831882953, 0, -0.5052500670827214), z_dir=(0.5052500670827214, 0, 0.8629729831882953))) as chamfer_1_piece_5:
        Polygon((36 - CHAMFER_1_SIZE, 0), (36, -CHAMFER_1_SIZE), (36, 0), align=None)
    revolve(axis=Axis((0, 2, 0), (0, 1, 0)), revolution_arc=59.304092442, mode=Mode.SUBTRACT)
    with BuildSketch(Plane(origin=(0, -1.5, 0), x_dir=(0, 0, -1), z_dir=(1, 0, 0))) as chamfer_1_piece_6:
        Polygon((41.5 - CHAMFER_1_SIZE, 0), (41.5, -CHAMFER_1_SIZE), (41.5, 0), align=None)
    revolve(axis=Axis((0, -1.5, 0), (0, 1, 0)), mode=Mode.SUBTRACT)
    with BuildSketch(Plane(origin=(0, 2, 0), x_dir=(0.8690458849516187, 0, 0.49473149267926925), z_dir=(-0.49473149267926925, 0, 0.8690458849516187))) as chamfer_1_piece_7:
        Polygon((36 - CHAMFER_1_SIZE, 0), (36, -CHAMFER_1_SIZE), (36, 0), align=None)
    revolve(axis=Axis((0, 2, 0), (0, 1, 0)), revolution_arc=59.304092442, mode=Mode.SUBTRACT)


solid = part.part
